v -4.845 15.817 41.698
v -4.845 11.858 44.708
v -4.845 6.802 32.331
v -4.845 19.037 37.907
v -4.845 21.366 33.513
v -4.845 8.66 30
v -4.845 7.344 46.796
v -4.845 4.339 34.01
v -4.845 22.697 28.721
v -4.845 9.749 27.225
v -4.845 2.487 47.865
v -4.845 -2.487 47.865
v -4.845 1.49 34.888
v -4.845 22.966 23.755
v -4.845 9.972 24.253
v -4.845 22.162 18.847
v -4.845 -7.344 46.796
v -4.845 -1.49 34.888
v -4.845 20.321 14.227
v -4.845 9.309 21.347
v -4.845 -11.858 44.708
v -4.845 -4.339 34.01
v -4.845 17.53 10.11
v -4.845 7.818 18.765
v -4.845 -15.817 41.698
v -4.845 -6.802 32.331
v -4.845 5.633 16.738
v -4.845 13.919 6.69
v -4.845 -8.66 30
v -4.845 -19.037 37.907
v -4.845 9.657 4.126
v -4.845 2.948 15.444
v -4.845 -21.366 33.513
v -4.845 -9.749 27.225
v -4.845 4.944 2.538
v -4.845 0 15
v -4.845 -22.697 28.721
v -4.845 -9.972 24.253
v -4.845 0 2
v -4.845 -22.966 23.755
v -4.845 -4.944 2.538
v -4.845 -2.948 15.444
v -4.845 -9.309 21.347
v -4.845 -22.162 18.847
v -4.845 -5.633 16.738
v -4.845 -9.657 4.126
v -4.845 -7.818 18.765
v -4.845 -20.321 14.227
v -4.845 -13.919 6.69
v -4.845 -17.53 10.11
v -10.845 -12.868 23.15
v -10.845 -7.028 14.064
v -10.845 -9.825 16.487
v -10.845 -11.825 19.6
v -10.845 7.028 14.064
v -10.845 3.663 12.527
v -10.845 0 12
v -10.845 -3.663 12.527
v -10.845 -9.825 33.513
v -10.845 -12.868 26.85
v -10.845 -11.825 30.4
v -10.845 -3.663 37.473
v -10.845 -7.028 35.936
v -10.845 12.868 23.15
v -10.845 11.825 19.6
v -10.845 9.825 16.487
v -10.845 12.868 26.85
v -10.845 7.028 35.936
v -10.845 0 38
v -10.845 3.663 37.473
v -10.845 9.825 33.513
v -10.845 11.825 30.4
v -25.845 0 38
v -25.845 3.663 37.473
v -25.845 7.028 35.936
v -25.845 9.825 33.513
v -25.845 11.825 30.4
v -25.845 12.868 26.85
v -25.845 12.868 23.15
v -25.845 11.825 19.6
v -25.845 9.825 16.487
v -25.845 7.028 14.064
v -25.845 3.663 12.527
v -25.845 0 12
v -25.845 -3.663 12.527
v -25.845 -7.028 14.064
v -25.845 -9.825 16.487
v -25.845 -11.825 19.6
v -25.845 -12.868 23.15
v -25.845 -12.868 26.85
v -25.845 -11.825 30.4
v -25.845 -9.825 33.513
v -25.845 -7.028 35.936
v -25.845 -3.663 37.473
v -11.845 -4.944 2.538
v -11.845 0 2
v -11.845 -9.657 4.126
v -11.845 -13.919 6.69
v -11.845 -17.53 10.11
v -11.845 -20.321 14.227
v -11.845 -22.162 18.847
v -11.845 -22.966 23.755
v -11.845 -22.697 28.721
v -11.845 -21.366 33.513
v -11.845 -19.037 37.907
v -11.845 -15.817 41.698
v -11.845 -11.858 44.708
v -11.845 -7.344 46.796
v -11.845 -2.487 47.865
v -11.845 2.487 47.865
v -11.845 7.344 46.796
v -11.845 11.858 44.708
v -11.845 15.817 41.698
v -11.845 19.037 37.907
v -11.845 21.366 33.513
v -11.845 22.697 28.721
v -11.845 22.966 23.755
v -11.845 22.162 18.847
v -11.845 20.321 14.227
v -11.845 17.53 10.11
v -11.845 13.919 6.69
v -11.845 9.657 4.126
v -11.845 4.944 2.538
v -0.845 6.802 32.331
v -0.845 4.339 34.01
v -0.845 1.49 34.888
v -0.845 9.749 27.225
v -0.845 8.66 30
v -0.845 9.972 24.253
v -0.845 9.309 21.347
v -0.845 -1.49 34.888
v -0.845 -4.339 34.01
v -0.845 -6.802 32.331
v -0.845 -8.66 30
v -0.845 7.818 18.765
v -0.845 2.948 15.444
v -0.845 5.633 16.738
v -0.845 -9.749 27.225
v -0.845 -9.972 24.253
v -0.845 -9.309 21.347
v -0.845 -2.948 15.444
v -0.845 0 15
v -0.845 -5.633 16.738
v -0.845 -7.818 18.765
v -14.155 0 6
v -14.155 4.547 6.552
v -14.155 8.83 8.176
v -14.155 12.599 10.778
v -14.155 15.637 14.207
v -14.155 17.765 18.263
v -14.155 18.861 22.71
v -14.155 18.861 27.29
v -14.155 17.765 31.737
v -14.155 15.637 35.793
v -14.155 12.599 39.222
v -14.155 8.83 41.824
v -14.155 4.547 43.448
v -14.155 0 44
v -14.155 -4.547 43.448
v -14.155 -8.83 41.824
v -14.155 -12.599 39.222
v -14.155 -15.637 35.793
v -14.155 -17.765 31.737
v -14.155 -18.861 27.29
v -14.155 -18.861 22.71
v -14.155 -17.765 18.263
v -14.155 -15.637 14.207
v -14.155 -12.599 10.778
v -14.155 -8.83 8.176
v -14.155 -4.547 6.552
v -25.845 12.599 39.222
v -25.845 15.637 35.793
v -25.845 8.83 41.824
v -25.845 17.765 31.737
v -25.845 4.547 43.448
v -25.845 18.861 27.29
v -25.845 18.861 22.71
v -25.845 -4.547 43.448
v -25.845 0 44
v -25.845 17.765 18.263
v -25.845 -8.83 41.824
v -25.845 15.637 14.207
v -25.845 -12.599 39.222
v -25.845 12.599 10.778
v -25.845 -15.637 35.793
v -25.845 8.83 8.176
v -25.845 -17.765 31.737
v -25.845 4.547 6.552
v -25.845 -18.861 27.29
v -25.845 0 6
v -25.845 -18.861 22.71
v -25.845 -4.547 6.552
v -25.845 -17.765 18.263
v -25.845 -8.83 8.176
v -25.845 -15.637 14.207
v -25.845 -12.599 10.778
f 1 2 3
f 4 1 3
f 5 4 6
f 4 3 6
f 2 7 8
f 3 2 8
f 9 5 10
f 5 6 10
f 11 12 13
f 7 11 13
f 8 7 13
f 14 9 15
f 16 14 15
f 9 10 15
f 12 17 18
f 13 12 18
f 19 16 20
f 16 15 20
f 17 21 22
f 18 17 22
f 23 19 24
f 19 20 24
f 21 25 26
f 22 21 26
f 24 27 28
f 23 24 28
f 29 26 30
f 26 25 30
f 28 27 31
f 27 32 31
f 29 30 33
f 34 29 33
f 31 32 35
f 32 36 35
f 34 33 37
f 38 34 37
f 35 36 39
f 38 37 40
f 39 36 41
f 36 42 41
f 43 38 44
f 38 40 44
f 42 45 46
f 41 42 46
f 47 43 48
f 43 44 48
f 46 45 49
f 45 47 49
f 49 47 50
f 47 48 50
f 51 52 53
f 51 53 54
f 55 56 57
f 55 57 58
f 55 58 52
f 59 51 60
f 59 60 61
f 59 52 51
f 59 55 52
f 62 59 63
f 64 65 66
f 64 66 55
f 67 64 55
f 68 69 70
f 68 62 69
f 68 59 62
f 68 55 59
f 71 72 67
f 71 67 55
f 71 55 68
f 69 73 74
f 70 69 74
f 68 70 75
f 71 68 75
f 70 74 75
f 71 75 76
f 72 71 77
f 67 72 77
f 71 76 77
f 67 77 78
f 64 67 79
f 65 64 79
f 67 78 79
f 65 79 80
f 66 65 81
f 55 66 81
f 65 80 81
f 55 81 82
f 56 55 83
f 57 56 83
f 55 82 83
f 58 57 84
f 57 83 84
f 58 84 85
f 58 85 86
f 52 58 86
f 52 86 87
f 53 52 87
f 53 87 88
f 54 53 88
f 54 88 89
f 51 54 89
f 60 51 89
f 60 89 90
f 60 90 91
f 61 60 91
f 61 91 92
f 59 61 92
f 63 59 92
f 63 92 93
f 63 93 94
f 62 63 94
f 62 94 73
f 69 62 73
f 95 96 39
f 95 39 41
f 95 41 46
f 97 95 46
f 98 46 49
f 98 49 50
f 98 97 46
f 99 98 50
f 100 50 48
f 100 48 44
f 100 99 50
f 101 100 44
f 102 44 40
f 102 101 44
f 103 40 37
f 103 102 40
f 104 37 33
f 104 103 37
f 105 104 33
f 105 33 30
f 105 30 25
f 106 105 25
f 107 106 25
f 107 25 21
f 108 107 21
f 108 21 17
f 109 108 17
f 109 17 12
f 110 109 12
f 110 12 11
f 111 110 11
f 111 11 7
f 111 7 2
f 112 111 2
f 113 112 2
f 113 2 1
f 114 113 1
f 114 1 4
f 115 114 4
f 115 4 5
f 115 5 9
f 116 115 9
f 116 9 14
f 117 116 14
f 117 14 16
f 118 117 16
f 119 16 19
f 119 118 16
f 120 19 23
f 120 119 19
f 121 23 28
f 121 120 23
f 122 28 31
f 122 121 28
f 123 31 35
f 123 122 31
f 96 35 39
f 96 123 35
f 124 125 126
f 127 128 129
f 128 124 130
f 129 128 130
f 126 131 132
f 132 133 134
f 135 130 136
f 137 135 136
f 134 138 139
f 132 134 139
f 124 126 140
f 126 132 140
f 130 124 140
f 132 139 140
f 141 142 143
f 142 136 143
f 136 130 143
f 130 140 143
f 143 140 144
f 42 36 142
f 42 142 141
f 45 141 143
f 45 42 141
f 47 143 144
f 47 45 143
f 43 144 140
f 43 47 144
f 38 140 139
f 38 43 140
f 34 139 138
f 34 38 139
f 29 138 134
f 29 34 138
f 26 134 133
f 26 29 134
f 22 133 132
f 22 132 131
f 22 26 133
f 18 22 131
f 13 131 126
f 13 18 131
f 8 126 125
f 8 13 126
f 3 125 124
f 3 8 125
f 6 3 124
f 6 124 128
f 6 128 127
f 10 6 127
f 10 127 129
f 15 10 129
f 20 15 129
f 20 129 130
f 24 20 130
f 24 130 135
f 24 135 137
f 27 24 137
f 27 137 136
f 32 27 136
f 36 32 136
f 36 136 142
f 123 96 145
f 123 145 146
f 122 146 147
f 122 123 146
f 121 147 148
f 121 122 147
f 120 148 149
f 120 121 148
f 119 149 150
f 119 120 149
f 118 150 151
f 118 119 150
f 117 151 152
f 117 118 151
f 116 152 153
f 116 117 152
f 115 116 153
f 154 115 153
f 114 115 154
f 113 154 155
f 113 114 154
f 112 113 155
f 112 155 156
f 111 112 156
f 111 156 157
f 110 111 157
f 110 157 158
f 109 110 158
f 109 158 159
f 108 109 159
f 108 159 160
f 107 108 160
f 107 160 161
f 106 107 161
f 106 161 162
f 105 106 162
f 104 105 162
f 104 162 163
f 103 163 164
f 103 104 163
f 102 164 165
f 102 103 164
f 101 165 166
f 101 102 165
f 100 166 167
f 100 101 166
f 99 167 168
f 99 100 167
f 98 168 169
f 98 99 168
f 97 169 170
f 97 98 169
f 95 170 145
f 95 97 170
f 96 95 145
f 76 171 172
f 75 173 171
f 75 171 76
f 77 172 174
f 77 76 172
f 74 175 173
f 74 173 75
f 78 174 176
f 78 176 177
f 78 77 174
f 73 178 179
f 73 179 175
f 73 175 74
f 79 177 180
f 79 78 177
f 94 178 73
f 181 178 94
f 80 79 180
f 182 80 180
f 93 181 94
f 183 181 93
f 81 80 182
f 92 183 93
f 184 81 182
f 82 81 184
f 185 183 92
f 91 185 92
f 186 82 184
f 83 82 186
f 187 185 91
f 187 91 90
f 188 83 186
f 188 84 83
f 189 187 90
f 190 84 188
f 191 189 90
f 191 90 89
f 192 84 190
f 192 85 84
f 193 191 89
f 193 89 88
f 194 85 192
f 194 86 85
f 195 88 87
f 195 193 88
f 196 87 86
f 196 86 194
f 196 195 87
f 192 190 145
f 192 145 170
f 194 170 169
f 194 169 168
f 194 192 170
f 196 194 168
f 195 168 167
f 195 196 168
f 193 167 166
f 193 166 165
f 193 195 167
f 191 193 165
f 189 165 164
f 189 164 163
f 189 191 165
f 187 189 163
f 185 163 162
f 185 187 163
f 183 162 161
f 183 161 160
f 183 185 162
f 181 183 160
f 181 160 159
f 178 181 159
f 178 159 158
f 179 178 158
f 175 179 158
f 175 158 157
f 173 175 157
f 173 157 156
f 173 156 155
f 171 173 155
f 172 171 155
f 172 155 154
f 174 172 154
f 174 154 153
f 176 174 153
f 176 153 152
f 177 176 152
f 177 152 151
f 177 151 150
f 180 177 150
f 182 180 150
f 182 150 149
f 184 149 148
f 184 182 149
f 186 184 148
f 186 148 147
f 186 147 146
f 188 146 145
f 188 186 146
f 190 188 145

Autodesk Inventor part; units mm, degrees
ref_plane "YZ Plane" through (0, 0, 0) normal (1, 0, 0) x (0, 1, 0)
ref_plane "XZ Plane" through (0, 0, 0) normal (0, 1, 0) x (-1, 0, 0)
ref_plane "XY Plane" through (0, 0, 0) normal (0, 0, 1) x (1, 0, 0)
sketch "Sketch1" plane through (0, 0, 0) normal (0, 1, 0) x (-1, 0, 0)
  line L0 (0.8453, 25) -> (0.8453, 15)
  line L1 (0.8453, 15) -> (4.8453, 15)
  line L2 (4.8453, 15) -> (4.8453, 2)
  line L3 (0.8453, 25) -> (25.8453, 25)
  line L4 (25.8453, 25) -> (25.8453, 6)
  line L5 (4.8453, 2) -> (11.8453, 2)
  line L6 (11.8453, 2) -> (14.1547, 6)
  line L7 (14.1547, 6) -> (25.8453, 6)
  point P0 (0, 0)
  dimension "d1" = 10
  dimension "d2" = 4
  dimension "d3" = 13
  dimension "d13" = 25
  dimension "d14" = 19
  dimension "d16" = 7
  dimension "d17" = 60
  dimension "d19" = 4
revolve "Revolution1" add sketch "Sketch1" angle 360 about axis through (-0.8453, 0, 25) along (-1, 0, 0)
sketch "Sketch2" plane through (-25.8453, 0, 25) normal (-1, 0, 0) x (0, 0, 1)
  circle A0 centre (0, 0) radius 13
  point P0 (-25, 0)
  dimension "d21" = 26
extrude "Extrusion1" cut sketch "Sketch2" against normal blind 15
thread "Thread1" size "M30x1" class "6H" standard "ANSI Metric M Profile" full length
properties part number "00.32.012 \"Valve\"" material "Steel"
